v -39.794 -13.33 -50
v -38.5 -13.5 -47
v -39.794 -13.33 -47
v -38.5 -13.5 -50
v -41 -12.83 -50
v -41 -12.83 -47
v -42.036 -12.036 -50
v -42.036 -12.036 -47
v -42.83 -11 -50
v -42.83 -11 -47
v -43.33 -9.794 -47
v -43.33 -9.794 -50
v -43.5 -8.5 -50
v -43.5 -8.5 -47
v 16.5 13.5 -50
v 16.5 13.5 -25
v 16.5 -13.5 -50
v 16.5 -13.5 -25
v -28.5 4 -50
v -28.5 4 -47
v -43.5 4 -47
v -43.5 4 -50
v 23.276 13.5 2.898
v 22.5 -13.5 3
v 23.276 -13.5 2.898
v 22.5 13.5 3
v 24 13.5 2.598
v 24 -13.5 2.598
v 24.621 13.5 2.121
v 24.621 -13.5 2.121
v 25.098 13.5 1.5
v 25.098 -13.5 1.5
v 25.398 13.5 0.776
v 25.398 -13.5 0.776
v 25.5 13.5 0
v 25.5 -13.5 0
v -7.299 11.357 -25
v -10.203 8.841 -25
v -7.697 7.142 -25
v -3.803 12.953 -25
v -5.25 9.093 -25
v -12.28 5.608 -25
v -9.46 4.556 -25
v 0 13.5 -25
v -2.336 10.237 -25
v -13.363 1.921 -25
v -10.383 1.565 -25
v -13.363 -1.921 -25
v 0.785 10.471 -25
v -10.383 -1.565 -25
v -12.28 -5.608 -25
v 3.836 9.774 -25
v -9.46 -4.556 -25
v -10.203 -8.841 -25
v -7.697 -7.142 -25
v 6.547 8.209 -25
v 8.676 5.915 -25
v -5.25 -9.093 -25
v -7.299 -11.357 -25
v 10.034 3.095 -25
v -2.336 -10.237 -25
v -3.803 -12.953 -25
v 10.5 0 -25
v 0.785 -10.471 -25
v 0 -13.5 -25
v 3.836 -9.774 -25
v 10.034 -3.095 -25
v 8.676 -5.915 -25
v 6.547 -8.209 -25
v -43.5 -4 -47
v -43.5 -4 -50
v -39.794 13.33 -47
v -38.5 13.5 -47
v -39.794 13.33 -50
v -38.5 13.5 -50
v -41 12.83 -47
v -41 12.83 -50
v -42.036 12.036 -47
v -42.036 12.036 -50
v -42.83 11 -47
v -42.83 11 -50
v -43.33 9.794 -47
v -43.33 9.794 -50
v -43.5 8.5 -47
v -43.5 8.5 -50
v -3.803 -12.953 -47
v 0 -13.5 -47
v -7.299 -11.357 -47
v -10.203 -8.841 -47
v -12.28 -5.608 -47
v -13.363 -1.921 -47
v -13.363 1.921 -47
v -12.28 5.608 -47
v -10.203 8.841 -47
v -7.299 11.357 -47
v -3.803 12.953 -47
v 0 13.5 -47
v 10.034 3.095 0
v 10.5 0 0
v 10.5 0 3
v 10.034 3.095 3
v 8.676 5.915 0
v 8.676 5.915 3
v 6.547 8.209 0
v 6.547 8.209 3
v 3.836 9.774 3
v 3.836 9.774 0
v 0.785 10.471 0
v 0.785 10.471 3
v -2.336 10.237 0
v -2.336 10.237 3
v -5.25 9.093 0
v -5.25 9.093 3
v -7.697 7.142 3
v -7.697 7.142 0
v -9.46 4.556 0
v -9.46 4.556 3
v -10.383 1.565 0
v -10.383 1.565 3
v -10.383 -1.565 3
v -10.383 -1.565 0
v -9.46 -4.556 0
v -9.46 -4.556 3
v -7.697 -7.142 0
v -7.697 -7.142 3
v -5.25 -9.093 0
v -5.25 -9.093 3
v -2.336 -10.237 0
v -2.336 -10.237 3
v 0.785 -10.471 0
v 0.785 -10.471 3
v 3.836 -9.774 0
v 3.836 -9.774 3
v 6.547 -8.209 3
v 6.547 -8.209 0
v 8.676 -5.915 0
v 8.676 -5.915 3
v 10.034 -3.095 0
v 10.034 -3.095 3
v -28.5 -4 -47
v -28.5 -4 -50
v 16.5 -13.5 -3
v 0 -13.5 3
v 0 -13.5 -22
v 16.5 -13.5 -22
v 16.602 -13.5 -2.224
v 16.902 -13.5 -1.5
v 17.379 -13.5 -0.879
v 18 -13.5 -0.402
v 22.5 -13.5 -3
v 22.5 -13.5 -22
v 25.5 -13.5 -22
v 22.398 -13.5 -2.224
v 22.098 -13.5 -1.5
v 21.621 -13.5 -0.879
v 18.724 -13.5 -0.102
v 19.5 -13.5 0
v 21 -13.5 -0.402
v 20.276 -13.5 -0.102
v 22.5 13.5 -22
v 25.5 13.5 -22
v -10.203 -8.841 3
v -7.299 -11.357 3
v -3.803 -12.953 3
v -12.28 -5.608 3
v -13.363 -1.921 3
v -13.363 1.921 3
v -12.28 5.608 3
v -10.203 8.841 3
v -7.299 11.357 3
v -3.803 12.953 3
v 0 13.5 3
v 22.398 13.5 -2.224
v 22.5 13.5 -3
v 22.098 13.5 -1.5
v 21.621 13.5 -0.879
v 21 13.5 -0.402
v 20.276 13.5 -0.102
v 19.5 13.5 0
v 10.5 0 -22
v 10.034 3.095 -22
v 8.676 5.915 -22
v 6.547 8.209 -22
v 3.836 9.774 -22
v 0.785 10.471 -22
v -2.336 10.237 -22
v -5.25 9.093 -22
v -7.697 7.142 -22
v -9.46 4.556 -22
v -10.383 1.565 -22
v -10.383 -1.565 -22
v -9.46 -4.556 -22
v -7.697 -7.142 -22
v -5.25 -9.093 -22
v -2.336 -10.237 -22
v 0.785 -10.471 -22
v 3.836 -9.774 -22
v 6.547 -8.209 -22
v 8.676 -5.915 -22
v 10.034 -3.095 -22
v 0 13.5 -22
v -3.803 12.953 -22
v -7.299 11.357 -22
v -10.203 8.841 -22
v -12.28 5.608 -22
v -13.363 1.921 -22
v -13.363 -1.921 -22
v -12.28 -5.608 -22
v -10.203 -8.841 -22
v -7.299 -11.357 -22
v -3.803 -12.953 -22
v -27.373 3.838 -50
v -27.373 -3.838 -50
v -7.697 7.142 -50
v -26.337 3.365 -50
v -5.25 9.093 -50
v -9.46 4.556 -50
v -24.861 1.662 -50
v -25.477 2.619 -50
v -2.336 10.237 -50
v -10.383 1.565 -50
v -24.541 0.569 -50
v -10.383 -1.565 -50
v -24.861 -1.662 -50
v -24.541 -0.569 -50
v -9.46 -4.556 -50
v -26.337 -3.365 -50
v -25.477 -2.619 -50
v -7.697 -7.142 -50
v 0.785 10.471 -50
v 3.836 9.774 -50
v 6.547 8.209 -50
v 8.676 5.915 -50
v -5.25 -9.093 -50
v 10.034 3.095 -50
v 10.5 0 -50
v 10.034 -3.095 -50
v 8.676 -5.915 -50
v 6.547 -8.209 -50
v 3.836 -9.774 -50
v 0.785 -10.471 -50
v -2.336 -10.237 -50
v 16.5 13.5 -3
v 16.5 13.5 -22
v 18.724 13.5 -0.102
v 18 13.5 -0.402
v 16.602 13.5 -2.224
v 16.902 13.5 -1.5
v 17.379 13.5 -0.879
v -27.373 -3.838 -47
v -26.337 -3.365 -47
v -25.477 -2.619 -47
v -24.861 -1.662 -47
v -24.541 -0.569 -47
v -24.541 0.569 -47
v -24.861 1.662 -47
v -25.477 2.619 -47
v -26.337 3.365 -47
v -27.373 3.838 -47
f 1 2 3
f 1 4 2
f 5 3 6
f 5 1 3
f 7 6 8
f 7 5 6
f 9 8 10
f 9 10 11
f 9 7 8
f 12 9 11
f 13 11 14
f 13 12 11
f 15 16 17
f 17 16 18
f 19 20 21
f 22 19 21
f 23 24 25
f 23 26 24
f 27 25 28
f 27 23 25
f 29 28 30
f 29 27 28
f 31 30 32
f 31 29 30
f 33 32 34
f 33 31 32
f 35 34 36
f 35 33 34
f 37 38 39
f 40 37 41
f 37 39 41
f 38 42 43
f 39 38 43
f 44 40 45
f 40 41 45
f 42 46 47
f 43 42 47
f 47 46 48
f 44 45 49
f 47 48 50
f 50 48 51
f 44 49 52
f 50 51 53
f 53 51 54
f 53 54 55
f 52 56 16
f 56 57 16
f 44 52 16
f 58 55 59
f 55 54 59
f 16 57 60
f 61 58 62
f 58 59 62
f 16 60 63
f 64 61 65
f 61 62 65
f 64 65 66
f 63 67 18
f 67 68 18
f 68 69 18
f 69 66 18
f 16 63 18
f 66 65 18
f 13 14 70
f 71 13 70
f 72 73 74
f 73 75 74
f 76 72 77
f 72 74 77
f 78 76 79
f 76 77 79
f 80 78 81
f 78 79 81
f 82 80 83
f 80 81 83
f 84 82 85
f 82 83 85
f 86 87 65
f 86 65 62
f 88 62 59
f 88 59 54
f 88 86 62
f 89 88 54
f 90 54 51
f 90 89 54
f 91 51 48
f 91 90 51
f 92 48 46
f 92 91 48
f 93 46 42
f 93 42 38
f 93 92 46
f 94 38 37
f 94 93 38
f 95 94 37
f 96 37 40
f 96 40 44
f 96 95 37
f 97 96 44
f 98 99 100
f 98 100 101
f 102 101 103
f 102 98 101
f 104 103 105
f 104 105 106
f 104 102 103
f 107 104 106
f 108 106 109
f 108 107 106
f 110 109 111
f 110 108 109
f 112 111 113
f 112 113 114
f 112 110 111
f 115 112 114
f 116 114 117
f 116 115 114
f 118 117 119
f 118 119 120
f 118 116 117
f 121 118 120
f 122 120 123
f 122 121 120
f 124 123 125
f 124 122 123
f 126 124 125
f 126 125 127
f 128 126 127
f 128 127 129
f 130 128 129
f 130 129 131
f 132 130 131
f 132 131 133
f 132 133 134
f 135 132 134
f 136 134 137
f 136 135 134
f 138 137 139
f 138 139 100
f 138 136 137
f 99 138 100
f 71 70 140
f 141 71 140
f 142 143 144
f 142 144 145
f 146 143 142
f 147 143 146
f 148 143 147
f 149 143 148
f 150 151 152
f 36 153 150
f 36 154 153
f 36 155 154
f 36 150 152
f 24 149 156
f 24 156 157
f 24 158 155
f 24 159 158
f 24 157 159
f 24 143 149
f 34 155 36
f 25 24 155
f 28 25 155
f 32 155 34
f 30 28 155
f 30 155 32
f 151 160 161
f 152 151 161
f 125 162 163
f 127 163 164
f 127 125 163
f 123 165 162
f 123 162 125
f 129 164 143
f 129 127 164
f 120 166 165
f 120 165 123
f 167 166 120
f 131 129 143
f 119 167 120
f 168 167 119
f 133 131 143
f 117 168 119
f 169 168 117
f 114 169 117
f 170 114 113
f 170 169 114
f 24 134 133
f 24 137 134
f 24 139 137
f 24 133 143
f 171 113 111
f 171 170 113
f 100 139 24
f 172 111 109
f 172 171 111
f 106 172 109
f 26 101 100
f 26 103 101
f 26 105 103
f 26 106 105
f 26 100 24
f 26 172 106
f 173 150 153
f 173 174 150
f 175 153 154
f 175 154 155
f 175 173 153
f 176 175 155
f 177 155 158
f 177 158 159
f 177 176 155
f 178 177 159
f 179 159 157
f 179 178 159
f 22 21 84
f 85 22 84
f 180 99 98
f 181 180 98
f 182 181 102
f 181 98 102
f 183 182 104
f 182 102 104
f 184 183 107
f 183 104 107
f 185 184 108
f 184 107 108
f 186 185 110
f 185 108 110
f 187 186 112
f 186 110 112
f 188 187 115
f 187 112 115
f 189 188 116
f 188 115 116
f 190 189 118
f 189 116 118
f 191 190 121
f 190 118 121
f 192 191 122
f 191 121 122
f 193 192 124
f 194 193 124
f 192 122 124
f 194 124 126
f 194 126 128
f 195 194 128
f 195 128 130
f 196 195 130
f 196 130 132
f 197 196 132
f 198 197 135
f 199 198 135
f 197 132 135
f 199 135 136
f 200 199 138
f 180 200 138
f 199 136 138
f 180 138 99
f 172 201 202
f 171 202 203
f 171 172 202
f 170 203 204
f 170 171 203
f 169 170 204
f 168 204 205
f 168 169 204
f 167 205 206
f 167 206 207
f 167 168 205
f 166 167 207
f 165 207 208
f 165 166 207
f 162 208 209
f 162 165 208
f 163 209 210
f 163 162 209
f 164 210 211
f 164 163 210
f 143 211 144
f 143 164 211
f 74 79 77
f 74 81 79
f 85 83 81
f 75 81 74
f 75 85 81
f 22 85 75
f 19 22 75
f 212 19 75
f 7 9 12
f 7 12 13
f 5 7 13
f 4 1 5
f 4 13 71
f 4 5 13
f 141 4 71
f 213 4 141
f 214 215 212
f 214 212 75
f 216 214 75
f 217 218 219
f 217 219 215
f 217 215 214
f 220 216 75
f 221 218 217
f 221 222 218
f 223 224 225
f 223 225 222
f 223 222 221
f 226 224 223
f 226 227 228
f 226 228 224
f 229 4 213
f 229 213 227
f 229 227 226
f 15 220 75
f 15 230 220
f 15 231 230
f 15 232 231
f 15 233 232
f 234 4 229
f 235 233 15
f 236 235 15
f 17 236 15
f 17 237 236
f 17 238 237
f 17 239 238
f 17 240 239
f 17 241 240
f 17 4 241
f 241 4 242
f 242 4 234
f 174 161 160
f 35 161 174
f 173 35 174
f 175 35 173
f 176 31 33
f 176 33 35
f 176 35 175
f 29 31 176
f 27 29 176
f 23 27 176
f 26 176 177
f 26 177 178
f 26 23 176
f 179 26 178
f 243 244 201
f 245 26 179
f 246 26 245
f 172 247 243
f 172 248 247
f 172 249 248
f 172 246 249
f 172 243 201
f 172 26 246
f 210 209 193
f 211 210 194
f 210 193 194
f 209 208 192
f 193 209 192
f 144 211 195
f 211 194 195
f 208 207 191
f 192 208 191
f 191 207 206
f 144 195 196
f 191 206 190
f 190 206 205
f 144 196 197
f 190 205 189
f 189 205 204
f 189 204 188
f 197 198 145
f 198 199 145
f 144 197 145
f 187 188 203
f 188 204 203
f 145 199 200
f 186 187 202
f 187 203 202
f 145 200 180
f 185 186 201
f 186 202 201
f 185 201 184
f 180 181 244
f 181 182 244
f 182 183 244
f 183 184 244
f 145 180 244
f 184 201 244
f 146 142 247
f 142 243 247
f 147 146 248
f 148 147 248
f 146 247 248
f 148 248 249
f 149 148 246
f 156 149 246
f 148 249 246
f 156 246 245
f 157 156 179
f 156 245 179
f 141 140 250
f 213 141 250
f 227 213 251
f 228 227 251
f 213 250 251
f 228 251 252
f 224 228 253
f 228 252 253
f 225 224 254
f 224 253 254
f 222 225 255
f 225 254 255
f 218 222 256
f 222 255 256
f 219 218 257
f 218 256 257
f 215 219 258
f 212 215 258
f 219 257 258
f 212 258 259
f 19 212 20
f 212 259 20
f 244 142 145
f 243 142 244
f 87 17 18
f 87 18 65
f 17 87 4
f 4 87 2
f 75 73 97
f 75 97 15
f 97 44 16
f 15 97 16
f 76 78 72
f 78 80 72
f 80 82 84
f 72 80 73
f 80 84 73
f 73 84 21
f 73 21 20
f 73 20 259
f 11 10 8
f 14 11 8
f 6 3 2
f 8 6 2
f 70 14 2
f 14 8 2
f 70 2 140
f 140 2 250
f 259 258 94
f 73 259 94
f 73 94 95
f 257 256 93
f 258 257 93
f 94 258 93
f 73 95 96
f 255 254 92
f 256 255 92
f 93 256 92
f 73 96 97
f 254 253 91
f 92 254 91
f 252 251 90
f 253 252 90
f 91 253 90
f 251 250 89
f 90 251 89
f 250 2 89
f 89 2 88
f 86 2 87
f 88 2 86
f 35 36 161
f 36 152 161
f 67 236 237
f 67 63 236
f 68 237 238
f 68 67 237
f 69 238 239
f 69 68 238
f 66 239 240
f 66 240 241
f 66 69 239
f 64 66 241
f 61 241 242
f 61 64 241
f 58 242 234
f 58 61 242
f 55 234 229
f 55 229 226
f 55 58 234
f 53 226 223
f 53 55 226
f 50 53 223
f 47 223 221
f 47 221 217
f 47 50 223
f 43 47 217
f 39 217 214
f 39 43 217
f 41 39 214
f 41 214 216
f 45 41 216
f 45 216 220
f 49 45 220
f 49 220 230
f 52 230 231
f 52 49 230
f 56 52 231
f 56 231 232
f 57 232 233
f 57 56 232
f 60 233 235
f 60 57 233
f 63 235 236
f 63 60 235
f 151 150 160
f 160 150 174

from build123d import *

# Parameters (mm, degrees)
F0_R     = 10.5
F0_W     = 6
F0_H     = 27
F0_W_2   = 3
F1_DEPTH = 3
F2_DEPTH = 22
F3_R     = 2.99999
F5_R     = 10.5
F6_DEPTH = 22
F7_DEPTH = 3
F8_R     = 5


# Not quite as in the source:
# - a fillet or chamfer is up to 0.001 mm smaller than in the source, because OpenCascade refuses the exact size


with BuildPart() as f1:
    # F0 (on Top) → F1 (new body)
    with BuildSketch(Plane.XY):
        with BuildLine():
            ThreePointArc((0, -13.5), (9.545941546, -9.545941546), (13.5, 0))
            ThreePointArc((13.5, 0), (9.545941546, 9.545941546), (0, 13.5))
            ThreePointArc((0, 13.5), (-13.5, 0), (0, -13.5))
        make_face()
        Circle(F0_R, mode=Mode.SUBTRACT)
        with BuildLine():
            Line((13.5, -13.5), (13.5, 0))
            ThreePointArc((13.5, 0), (9.545941546, -9.545941546), (0, -13.5))
            Line((0, -13.5), (13.5, -13.5))
        make_face()
        with BuildLine():
            ThreePointArc((0, 13.5), (9.545941546, 9.545941546), (13.5, 0))
            Line((13.5, 0), (13.5, 13.5))
            Line((13.5, 13.5), (0, 13.5))
        make_face()
        Polygon((13.5, 13.5), (13.5, 0), (13.5, -13.5), (16.5, -13.5), (16.5, 13.5), align=None)
        with Locations((19.5, 0)):
            Rectangle(F0_W, F0_H)
        with Locations((24, 0)):
            Rectangle(F0_W_2, F0_H)
    extrude(amount=F1_DEPTH)

    # F0 (on Top) → F2 (join)
    with BuildSketch(Plane.XY):
        with BuildLine():
            ThreePointArc((0, -13.5), (9.545941546, -9.545941546), (13.5, 0))
            ThreePointArc((13.5, 0), (9.545941546, 9.545941546), (0, 13.5))
            ThreePointArc((0, 13.5), (-13.5, 0), (0, -13.5))
        make_face()
        Circle(F0_R, mode=Mode.SUBTRACT)
        with BuildLine():
            ThreePointArc((0, 13.5), (9.545941546, 9.545941546), (13.5, 0))
            Line((13.5, 0), (13.5, 13.5))
            Line((13.5, 13.5), (0, 13.5))
        make_face()
        Polygon((13.5, 13.5), (13.5, 0), (13.5, -13.5), (16.5, -13.5), (16.5, 13.5), align=None)
        with Locations((24, 0)):
            Rectangle(F0_W_2, F0_H)
        with BuildLine():
            Line((13.5, -13.5), (13.5, 0))
            ThreePointArc((13.5, 0), (9.545941546, -9.545941546), (0, -13.5))
            Line((0, -13.5), (13.5, -13.5))
        make_face()
    extrude(amount=-F2_DEPTH)

    # F3 (radius 3 in the source; OpenCascade refuses exactly that, so slightly less here)
    f3_edges = [f1.edges().sort_by_distance(p)[0] for p in [
        (16.5, 0, 0),
        (22.5, 0, 0),
        (25.5, 0, 3),
    ]]
    fillet(f3_edges, radius=F3_R)


with BuildPart() as f6:
    # F5 (on offset) → F6 (new body)
    with BuildSketch(Plane(origin=(0, 0, -47), x_dir=(1, 0, 0), z_dir=(0, 0, -1))):
        with BuildLine():
            Line((16.5, 13.5), (0, 13.5))
            ThreePointArc((0, 13.5), (-13.5, 0), (0, -13.5))
            Line((0, -13.5), (16.5, -13.5))
            Line((16.5, -13.5), (16.5, 13.5))
        make_face()
        Circle(F5_R, mode=Mode.SUBTRACT)
    extrude(amount=-F6_DEPTH)

    # F5 (on offset) → F7 (join)
    with BuildSketch(Plane(origin=(0, 0, -47), x_dir=(1, 0, 0), z_dir=(0, 0, -1))):
        with BuildLine():
            Line((16.5, 13.5), (0, 13.5))
            ThreePointArc((0, 13.5), (-13.5, 0), (0, -13.5))
            Line((0, -13.5), (16.5, -13.5))
            Line((16.5, -13.5), (16.5, 13.5))
        make_face()
        Circle(F5_R, mode=Mode.SUBTRACT)
        with BuildLine():
            ThreePointArc((0, -13.5), (-13.5, 0), (0, 13.5))
            Line((0, 13.5), (-43.5, 13.5))
            Line((-43.5, 13.5), (-43.5, 4))
            Line((-43.5, 4), (-28.5, 4))
            ThreePointArc((-28.5, 4), (-24.5, 0), (-28.5, -4))
            Line((-28.5, -4), (-43.5, -4))
            Line((-43.5, -4), (-43.5, -13.5))
            Line((-43.5, -13.5), (0, -13.5))
        make_face()
    extrude(amount=F7_DEPTH)

    # F8
    f8_edges = [f6.edges().sort_by_distance(p)[0] for p in [
        (-43.5, -13.5, -48.5),
        (-43.5, 13.5, -48.5),
    ]]
    fillet(f8_edges, radius=F8_R)


solid = Compound([f1.part, f6.part])
